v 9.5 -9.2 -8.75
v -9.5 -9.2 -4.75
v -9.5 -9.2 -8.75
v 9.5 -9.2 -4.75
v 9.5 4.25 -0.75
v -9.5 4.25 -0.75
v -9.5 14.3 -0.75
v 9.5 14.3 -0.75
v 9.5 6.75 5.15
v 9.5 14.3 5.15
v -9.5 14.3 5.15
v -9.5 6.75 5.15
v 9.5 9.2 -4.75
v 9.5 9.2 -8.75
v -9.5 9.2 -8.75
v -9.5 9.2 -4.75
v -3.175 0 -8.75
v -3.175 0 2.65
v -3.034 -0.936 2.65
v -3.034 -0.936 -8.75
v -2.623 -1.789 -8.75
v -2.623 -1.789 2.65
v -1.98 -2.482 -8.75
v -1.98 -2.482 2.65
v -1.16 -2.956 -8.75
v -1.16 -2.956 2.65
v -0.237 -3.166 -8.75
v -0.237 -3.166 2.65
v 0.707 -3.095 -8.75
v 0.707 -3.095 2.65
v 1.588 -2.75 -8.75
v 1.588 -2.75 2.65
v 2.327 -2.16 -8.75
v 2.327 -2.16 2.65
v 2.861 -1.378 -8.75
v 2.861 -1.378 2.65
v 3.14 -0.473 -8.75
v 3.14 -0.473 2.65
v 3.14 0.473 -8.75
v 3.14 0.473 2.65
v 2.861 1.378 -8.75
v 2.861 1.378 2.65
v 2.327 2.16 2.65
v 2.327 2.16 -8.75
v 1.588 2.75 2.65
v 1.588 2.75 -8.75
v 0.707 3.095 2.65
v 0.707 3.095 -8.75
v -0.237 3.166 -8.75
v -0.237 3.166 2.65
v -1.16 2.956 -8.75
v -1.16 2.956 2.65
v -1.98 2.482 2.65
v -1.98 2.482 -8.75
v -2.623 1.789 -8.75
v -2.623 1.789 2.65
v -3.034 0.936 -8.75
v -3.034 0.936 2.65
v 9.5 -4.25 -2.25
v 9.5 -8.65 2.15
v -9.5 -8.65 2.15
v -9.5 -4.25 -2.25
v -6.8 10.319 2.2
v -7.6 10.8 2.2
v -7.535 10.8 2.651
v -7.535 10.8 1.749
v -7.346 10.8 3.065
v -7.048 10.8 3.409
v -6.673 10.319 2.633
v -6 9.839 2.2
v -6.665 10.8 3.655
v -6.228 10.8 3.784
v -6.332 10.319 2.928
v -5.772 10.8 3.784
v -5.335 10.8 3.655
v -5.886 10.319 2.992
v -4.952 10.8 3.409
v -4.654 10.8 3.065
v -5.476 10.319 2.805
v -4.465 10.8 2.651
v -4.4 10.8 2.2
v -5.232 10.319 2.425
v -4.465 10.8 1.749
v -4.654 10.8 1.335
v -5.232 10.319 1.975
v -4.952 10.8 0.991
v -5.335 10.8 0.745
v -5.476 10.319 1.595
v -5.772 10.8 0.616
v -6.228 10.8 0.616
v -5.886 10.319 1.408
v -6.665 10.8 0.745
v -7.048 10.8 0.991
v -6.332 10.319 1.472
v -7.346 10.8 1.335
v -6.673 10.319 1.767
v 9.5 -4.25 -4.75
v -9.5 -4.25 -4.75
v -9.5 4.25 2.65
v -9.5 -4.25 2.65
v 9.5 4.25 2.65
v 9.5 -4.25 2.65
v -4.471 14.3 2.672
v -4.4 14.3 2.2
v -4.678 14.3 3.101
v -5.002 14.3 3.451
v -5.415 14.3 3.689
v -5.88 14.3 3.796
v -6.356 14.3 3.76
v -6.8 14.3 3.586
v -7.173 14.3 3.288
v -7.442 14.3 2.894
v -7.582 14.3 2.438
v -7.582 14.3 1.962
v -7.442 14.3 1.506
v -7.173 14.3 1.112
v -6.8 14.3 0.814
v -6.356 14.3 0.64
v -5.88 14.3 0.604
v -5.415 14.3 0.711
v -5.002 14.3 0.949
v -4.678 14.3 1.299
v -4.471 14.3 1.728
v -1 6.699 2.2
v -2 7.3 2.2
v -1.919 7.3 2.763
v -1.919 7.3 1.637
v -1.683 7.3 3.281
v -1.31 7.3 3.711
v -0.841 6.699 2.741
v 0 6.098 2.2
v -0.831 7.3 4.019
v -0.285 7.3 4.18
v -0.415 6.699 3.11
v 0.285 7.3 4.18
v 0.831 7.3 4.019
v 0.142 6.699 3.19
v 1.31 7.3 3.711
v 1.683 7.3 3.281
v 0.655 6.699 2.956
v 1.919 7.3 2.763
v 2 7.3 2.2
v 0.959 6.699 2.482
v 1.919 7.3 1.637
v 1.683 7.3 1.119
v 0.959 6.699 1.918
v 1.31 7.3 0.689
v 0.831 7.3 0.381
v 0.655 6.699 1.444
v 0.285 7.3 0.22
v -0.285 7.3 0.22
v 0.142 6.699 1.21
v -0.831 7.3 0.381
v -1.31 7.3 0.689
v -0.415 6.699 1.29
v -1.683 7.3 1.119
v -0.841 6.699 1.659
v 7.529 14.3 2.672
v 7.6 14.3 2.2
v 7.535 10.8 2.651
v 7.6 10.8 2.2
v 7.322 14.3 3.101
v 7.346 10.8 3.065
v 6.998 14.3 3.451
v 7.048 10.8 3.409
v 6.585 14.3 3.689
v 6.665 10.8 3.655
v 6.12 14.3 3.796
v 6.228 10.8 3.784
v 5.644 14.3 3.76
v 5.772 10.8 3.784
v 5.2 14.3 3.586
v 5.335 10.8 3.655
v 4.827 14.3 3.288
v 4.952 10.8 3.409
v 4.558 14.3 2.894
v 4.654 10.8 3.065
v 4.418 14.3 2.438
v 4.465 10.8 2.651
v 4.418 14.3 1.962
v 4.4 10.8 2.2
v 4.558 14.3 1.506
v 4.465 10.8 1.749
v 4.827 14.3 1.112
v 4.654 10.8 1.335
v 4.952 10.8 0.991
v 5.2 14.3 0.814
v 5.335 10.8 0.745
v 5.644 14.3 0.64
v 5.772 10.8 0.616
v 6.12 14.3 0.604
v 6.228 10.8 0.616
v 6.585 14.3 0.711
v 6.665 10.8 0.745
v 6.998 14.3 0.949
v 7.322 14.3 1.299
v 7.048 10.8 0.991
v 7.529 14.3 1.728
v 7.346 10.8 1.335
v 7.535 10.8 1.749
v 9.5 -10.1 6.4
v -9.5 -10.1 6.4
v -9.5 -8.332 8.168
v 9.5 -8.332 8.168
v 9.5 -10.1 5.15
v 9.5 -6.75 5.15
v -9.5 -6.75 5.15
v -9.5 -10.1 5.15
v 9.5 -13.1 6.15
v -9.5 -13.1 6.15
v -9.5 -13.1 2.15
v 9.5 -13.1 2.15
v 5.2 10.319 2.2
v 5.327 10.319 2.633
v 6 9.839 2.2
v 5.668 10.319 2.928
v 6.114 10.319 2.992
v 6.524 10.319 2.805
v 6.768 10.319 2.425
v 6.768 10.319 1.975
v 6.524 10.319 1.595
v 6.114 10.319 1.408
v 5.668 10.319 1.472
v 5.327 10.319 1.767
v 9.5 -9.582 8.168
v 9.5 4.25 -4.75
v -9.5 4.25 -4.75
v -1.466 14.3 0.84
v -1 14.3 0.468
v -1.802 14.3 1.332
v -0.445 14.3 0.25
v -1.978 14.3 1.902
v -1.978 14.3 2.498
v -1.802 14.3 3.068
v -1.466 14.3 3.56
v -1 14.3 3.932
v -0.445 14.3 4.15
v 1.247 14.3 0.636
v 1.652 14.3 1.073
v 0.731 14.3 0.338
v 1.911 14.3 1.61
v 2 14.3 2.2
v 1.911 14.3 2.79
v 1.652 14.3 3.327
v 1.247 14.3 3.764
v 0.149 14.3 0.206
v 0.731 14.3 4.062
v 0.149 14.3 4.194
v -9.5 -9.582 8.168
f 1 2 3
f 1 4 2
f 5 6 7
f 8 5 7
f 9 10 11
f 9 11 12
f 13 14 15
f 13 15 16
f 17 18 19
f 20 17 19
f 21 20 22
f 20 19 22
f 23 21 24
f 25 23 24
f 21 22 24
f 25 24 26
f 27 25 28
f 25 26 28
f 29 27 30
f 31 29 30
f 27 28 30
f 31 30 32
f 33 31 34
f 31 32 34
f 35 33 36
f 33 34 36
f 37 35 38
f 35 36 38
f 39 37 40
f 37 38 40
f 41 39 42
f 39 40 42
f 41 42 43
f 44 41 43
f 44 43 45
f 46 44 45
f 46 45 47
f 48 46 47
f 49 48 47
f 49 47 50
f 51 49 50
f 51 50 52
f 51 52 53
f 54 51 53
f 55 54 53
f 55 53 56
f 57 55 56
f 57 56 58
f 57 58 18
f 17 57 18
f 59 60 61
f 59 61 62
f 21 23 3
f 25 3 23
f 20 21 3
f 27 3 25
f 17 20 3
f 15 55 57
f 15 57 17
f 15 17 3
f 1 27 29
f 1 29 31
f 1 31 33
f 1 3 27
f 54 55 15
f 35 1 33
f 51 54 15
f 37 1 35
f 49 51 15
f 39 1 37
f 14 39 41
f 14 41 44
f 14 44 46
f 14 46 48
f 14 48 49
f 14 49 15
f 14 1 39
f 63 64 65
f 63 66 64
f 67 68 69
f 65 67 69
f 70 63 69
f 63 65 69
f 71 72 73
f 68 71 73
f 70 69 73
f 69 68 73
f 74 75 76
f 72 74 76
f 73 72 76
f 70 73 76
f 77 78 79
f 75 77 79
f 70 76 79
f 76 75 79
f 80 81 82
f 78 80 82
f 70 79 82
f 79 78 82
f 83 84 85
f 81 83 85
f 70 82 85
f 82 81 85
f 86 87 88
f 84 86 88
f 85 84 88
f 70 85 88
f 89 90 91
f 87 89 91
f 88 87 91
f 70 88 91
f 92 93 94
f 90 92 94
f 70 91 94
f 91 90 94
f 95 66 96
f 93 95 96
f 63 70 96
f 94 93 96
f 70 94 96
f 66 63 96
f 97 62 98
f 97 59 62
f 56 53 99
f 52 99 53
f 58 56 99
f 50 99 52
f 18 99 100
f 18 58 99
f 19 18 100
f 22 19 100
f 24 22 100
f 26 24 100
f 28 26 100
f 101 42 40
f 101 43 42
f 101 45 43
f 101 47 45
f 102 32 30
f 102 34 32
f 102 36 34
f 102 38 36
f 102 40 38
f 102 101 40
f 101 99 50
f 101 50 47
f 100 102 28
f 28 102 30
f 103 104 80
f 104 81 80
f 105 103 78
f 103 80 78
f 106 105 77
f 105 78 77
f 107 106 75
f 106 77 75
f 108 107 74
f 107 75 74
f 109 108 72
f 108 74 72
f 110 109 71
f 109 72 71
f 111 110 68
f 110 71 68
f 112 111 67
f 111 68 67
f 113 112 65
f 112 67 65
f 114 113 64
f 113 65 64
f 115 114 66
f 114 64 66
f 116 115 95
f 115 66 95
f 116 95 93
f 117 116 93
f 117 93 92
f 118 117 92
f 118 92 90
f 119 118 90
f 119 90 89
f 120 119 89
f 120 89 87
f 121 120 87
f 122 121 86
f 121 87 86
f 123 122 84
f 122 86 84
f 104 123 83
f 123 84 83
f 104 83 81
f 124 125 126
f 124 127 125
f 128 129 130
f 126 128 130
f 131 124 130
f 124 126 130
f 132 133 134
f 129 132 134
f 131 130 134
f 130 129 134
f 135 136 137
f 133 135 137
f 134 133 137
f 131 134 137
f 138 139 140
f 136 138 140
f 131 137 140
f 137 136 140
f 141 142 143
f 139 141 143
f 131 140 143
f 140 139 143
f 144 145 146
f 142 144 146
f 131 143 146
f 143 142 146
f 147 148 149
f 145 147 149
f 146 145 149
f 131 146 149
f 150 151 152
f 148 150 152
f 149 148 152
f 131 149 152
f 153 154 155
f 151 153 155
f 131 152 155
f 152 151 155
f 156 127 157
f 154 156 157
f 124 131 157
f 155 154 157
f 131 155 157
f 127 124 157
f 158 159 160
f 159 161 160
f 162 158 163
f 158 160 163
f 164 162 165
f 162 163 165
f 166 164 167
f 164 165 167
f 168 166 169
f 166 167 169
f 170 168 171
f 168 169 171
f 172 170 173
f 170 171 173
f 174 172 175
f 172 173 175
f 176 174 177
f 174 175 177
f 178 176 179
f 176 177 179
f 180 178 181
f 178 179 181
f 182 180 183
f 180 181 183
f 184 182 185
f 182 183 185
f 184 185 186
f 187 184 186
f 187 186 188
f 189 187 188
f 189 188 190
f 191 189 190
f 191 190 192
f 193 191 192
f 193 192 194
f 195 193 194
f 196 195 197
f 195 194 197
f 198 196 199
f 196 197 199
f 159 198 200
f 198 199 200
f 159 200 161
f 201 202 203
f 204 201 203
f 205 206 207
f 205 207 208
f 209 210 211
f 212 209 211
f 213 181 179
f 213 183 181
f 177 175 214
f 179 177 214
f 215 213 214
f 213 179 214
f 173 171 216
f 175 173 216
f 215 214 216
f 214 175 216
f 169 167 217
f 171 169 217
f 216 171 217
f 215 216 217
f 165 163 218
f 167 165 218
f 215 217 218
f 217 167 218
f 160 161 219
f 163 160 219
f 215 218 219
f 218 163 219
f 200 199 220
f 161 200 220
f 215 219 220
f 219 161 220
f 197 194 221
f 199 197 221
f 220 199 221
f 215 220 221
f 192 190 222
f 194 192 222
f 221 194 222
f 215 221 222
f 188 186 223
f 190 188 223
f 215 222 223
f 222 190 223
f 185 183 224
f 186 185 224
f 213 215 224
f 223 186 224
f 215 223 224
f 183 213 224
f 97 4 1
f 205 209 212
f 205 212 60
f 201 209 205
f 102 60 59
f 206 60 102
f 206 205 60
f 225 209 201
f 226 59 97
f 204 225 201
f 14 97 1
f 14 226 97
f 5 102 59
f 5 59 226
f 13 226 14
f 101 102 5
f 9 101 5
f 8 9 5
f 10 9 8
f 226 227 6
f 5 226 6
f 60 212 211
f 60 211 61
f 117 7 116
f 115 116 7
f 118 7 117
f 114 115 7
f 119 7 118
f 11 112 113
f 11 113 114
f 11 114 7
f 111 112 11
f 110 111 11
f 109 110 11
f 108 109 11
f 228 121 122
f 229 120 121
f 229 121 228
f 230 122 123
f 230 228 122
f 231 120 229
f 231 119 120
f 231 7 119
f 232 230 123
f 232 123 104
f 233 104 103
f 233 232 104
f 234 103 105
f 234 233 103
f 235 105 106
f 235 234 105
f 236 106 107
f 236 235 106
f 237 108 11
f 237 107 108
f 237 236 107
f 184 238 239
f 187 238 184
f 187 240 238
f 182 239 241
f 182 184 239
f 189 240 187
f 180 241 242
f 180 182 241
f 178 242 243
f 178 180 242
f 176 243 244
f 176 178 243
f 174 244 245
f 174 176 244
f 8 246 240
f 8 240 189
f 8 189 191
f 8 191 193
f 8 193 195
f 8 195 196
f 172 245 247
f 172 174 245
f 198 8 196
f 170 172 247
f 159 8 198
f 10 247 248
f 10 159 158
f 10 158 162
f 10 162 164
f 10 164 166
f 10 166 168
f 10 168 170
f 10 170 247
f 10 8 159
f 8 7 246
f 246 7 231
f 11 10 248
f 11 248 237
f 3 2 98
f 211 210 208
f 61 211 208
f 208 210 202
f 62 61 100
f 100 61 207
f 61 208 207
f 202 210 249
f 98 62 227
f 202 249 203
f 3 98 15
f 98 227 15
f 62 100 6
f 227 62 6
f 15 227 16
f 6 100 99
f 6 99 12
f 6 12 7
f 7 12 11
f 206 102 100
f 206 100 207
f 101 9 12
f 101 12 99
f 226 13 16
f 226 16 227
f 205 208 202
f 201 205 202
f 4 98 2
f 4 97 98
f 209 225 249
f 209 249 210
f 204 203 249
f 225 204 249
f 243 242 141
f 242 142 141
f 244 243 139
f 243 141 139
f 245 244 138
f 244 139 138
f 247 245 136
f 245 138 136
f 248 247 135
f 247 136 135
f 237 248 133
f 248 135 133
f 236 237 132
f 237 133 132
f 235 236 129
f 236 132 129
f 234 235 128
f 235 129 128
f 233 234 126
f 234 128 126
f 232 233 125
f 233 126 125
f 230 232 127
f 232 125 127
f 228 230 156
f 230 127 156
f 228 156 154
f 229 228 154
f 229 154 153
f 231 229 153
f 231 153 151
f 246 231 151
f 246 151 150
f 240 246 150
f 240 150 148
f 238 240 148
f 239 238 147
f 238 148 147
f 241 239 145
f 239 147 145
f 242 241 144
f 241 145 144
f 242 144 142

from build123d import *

# Parameters (mm, degrees)
F1_DEPTH = 9.5
F3_D     = 6.35
F5_D     = 4
F5_DEPTH = 7
F5_TIP   = 1.2017212381
F6_D     = 3.2
F6_DEPTH = 3.5
F6_TIP   = 0.9613769904


with BuildPart() as f1:
    # F0 (on Right) → F1 (new body, symmetric)
    with BuildSketch(Plane.YZ):
        Polygon((-9.2, -4.75), (-9.2, -8.75), (9.2, -8.75), (9.2, -4.75), (4.25, -4.75), (4.25, -0.75), (14.3, -0.75), (14.3, 5.15), (6.75, 5.15), (4.25, 2.65), (-4.25, 2.65), (-6.75, 5.15), (-10.1, 5.15), (-10.1, 6.4), (-8.332233047, 8.167766953), (-9.582233047, 8.167766953), (-13.1, 6.15), (-13.1, 2.15), (-8.65, 2.15), (-4.25, -2.25), (-4.25, -4.75), align=None)
    extrude(amount=F1_DEPTH, both=True)

    # F3 (through all)
    with Locations(Plane(origin=(0, 0, -8.75), x_dir=(1, 0, 0), z_dir=(0, 0, -1))):
        with Locations((0, 0)):
            Hole(F3_D / 2)

    # F5
    with Locations(Plane(origin=(0, 14.3, 0), x_dir=(-1, 0, 0), z_dir=(0, 1, 0))):
        with Locations((0, 2.2)):
            Hole(F5_D / 2, depth=F5_DEPTH)
            with Locations((0, 0, -(F5_DEPTH + F5_TIP / 2))):  # 118° drill point
                Cone(0, F5_D / 2, F5_TIP, mode=Mode.SUBTRACT)

    # F6
    with Locations(Plane(origin=(0, 14.3, 0), x_dir=(-1, 0, 0), z_dir=(0, 1, 0))):
        with Locations((-6, 2.2), (6, 2.2)):
            Hole(F6_D / 2, depth=F6_DEPTH)
            with Locations((0, 0, -(F6_DEPTH + F6_TIP / 2))):  # 118° drill point
                Cone(0, F6_D / 2, F6_TIP, mode=Mode.SUBTRACT)


solid = f1.part
